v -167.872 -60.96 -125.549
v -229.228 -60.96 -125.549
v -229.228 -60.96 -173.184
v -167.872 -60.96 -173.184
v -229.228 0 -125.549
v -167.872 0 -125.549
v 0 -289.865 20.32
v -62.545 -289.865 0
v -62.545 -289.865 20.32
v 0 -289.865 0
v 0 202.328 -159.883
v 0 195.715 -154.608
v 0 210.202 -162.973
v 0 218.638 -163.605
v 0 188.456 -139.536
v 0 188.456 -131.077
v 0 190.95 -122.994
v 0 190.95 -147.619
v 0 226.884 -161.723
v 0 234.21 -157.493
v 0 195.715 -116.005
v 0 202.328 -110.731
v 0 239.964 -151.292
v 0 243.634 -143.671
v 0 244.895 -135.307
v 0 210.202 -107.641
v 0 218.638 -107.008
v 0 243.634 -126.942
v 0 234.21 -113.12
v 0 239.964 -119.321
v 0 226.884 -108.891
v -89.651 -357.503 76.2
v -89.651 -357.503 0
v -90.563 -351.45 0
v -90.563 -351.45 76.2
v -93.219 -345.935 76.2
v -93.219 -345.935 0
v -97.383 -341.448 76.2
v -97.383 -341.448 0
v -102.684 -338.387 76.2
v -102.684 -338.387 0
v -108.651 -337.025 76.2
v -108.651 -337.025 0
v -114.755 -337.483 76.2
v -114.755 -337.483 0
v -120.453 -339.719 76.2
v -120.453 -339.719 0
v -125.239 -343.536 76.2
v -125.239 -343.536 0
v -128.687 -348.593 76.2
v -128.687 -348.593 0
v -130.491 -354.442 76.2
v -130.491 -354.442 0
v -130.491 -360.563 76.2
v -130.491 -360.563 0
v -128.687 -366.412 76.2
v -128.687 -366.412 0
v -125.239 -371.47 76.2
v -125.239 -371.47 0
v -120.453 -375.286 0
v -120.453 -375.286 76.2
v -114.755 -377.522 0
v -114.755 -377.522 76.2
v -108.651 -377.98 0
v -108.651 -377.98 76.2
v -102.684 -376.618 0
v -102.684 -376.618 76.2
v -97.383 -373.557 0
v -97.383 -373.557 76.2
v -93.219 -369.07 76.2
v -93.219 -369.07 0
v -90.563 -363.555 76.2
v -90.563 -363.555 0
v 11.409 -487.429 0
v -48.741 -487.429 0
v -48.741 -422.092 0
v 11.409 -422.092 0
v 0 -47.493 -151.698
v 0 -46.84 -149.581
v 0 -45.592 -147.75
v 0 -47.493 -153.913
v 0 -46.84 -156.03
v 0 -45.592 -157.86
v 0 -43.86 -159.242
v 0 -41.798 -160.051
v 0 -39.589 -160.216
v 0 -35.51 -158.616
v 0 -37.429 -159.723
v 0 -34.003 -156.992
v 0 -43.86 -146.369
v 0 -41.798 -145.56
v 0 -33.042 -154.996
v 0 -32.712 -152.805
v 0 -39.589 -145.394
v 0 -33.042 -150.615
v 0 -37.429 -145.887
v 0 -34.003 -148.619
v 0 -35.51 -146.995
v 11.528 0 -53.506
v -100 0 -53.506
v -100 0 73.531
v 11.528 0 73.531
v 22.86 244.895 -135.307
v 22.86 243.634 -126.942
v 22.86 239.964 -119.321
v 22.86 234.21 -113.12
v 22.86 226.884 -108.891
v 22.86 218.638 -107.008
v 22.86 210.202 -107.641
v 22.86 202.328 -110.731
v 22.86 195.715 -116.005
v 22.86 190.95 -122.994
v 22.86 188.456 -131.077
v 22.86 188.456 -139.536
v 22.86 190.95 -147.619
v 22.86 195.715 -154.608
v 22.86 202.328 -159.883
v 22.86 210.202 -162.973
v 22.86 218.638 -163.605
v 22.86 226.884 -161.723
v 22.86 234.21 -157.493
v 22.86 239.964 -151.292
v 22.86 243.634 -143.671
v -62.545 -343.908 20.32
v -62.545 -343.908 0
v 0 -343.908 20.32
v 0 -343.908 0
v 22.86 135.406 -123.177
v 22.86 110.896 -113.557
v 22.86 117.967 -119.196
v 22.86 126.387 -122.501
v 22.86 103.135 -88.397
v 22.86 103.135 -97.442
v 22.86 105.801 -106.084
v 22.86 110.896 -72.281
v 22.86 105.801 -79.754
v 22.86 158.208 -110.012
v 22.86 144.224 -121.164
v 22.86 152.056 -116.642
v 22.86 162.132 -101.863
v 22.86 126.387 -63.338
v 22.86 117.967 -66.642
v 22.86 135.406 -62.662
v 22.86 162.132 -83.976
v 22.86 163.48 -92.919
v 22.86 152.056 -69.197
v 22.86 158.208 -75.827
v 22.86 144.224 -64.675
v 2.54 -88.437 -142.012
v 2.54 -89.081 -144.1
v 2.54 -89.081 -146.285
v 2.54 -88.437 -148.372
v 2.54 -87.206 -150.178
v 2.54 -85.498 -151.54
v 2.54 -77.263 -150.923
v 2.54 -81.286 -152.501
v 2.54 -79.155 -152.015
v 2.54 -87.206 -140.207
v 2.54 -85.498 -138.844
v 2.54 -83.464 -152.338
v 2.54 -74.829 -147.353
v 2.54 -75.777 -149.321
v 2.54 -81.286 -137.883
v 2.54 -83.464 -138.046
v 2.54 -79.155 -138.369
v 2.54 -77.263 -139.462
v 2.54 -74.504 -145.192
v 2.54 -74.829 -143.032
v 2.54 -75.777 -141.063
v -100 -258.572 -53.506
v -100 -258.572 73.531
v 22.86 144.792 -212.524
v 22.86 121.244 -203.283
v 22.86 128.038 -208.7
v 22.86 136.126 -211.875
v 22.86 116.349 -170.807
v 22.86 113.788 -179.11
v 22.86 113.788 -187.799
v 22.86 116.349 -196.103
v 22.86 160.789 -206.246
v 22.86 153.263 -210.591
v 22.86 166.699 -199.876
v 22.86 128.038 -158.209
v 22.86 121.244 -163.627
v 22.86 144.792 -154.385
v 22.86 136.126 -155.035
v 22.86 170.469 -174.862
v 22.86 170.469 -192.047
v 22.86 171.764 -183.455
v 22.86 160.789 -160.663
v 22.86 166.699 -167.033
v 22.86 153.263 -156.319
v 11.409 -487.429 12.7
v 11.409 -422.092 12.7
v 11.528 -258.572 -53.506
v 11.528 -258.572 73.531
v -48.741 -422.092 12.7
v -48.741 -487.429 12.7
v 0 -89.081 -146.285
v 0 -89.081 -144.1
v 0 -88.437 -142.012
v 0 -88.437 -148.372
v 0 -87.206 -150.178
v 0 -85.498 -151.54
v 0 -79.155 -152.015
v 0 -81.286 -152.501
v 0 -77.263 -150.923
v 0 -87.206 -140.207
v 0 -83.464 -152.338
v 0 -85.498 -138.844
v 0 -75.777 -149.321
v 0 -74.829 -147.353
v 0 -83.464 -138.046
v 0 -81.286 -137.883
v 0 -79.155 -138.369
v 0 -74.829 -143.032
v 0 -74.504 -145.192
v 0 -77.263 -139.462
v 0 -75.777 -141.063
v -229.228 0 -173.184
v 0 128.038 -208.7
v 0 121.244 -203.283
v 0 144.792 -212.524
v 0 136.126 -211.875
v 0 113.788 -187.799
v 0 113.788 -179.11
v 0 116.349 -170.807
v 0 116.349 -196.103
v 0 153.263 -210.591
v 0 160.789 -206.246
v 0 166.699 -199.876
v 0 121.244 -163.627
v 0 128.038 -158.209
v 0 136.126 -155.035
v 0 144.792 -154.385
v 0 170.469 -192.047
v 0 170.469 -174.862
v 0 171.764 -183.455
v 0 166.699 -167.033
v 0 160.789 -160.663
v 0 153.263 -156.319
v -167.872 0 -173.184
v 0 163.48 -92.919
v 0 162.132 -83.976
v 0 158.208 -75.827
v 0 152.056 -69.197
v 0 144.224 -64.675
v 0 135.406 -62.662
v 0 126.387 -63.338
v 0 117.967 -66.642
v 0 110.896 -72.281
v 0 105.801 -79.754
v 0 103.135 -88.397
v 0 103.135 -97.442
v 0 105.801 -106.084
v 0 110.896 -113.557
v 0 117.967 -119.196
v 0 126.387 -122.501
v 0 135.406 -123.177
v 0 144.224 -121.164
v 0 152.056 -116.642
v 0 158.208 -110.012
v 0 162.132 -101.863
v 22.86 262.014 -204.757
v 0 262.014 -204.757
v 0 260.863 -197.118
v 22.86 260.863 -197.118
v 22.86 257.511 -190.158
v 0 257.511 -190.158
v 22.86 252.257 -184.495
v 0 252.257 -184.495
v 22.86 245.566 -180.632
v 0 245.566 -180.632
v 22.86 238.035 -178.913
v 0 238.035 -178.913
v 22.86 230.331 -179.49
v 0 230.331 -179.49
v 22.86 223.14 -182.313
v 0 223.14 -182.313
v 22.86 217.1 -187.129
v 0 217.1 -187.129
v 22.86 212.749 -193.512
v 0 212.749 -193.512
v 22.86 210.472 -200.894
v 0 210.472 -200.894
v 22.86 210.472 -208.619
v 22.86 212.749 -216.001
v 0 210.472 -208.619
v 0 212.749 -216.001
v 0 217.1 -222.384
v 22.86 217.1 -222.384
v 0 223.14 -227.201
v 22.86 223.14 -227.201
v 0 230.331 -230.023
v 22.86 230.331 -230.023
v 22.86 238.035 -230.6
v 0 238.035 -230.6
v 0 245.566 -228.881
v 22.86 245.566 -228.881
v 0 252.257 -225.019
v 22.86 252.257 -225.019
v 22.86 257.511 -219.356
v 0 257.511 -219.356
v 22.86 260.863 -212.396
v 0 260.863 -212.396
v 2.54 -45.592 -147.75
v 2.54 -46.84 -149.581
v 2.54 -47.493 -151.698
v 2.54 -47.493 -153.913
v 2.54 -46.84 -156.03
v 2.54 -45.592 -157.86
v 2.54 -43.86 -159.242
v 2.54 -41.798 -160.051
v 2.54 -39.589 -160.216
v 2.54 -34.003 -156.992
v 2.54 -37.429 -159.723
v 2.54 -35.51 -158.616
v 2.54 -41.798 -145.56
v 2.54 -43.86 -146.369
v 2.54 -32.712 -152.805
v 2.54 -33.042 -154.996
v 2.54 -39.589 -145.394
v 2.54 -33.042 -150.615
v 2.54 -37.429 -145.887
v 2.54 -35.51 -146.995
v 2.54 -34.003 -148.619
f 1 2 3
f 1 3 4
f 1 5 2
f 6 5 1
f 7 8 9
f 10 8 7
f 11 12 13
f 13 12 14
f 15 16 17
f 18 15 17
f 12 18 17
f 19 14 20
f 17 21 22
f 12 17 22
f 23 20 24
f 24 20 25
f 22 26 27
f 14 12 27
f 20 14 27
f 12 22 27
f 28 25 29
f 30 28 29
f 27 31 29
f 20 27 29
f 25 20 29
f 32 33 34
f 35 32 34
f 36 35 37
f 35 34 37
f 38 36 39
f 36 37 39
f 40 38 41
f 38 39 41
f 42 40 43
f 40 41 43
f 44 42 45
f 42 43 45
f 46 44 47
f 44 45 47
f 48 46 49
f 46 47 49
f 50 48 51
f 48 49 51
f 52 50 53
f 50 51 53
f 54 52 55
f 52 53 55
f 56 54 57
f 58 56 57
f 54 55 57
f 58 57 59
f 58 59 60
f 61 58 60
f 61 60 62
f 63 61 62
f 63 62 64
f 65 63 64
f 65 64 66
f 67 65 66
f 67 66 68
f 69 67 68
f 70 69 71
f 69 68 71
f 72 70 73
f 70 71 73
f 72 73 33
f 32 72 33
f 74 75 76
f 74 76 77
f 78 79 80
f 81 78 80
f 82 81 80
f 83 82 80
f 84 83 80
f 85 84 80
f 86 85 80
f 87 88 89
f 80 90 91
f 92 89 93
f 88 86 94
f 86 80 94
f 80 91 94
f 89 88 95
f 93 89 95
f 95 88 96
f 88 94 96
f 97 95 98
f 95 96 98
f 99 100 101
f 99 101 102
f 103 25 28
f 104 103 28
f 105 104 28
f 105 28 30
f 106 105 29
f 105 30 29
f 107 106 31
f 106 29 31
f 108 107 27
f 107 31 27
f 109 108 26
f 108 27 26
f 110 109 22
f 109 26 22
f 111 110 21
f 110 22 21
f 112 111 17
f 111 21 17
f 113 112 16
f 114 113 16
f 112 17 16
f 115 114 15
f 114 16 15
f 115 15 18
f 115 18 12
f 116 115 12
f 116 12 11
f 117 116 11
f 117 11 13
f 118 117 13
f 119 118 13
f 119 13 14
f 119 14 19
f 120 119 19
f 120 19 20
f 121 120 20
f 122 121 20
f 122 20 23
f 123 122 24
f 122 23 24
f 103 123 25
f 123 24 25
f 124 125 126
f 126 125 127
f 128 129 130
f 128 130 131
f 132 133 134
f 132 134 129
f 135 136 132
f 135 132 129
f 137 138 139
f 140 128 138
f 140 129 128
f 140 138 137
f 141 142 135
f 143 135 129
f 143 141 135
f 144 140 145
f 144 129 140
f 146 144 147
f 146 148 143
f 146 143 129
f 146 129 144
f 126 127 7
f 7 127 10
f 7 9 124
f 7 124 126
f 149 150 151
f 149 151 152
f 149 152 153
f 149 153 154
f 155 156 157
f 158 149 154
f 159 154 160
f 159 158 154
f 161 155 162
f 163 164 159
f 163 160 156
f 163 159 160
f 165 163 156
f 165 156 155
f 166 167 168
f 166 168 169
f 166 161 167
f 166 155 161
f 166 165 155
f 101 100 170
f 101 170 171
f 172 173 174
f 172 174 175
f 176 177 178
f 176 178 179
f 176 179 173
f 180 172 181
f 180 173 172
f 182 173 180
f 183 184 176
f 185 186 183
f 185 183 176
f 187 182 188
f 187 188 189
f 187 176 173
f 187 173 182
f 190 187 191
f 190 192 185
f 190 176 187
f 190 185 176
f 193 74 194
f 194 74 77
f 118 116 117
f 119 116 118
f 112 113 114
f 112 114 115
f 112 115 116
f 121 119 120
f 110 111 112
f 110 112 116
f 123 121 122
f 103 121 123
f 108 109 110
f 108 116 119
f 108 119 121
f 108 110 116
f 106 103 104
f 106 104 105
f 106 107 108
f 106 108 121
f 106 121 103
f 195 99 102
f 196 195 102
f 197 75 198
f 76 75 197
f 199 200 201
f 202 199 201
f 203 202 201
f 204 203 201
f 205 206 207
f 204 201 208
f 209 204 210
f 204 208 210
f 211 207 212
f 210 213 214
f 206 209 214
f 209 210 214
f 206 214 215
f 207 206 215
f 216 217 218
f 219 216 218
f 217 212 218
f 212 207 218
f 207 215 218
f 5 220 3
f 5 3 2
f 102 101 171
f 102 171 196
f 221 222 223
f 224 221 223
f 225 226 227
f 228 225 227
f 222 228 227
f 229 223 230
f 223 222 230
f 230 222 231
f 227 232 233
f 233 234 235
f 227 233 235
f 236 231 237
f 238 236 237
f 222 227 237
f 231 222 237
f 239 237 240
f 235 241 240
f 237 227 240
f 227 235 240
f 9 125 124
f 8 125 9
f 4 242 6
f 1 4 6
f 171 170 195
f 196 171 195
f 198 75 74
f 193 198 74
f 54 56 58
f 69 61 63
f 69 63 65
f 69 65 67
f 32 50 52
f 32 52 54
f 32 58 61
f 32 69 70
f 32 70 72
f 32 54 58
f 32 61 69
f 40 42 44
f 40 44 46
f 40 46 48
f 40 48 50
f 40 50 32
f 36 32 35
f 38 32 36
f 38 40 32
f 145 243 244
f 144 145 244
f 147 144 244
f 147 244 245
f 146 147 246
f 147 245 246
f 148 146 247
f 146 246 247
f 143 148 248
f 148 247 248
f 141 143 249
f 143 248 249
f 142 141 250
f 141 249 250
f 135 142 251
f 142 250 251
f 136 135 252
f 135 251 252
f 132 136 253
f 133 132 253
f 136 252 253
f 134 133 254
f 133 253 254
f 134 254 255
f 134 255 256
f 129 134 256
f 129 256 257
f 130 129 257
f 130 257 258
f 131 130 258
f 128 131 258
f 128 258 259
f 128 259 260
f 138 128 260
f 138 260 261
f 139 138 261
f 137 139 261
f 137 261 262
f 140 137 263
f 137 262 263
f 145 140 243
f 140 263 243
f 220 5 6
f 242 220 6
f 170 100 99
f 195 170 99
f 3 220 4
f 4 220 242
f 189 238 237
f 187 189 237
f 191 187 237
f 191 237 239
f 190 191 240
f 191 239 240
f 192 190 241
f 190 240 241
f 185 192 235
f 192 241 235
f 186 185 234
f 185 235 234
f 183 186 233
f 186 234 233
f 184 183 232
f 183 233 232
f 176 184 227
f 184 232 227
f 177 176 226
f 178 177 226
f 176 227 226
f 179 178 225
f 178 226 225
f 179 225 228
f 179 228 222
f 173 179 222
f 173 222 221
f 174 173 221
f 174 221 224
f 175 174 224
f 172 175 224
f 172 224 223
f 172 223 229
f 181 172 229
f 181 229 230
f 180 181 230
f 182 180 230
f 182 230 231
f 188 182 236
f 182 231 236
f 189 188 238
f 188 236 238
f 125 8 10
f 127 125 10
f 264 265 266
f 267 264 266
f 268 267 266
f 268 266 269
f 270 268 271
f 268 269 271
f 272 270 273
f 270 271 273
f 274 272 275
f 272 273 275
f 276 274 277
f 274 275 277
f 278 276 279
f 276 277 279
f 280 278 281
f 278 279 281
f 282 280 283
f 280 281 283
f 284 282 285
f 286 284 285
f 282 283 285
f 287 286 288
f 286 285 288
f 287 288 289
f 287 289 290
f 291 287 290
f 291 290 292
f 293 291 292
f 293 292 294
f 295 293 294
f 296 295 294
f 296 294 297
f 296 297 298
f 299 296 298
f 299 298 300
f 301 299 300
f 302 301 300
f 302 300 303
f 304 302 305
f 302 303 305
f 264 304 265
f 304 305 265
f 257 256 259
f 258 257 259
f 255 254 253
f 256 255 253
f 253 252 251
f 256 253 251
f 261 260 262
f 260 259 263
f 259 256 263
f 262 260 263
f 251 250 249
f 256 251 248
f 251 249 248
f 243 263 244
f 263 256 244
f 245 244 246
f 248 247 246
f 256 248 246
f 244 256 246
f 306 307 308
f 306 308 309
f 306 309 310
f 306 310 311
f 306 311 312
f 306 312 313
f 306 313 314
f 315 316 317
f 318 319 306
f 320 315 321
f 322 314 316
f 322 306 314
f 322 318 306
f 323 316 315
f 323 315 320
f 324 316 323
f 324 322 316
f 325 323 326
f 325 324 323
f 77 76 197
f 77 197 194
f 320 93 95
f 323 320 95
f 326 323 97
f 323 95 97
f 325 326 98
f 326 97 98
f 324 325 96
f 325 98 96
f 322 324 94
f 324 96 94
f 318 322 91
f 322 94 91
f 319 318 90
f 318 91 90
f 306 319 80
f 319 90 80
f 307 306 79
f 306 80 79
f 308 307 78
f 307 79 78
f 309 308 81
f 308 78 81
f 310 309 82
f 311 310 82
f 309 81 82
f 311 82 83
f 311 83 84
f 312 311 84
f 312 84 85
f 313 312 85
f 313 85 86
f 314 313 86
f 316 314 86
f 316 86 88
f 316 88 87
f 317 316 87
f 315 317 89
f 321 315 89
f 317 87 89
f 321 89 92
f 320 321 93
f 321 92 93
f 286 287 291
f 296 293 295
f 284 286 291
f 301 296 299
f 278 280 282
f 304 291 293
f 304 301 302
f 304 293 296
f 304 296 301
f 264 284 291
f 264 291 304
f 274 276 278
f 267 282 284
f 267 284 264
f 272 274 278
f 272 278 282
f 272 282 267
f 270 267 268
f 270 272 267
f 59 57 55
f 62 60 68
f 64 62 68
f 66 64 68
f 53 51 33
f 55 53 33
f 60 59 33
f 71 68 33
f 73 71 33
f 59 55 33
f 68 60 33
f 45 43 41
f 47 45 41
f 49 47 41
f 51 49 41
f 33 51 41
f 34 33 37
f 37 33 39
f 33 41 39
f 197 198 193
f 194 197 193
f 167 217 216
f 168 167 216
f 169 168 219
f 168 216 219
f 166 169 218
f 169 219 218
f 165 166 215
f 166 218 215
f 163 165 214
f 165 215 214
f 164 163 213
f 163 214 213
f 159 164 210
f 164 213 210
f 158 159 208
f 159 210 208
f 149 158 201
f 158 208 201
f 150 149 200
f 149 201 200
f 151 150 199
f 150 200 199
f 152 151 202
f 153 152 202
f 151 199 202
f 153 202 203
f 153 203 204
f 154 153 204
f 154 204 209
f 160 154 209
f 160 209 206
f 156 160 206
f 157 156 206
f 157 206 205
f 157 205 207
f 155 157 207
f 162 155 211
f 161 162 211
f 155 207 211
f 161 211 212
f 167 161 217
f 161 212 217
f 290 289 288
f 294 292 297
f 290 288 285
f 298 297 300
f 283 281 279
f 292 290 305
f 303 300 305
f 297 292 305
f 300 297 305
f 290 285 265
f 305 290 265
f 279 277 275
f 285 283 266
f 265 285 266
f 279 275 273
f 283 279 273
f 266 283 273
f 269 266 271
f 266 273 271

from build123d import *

# Parameters (mm, degrees)
F0_W      = 111.528584
F0_H      = 127.037018
F1_DEPTH  = 258.572
F2_W      = 62.544964
F2_H      = 54.04234
F3_DEPTH  = 20.32
F4_W      = 61.35641
F4_H      = 47.634989
F5_DEPTH  = 60.96
F6_R      = 28.37764
F6_R_2    = 25.916033
F6_R_3    = 29.151088
F6_R_4    = 30.342157
F7_DEPTH  = 22.86
F8_R      = 7.329758
F9_DEPTH  = 2.54
F10_R     = 7.431939
F11_DEPTH = 2.54
F12_R     = 20.534601
F13_DEPTH = 76.2
F14_W     = 60.150437
F14_H     = 65.336704
F15_DEPTH = 12.7


with BuildPart() as f1:
    # F0 (on Front) → F1 (new body)
    with BuildSketch(Plane.XZ):
        with Locations((-44.236037, 10.01291)):
            Rectangle(F0_W, F0_H)
    extrude(amount=F1_DEPTH)


with BuildPart() as f3:
    # F2 (on Top) → F3 (new body)
    with BuildSketch(Plane.XY):
        with Locations((-31.272482, -316.886425)):
            Rectangle(F2_W, F2_H)
    extrude(amount=F3_DEPTH)


with BuildPart() as f5:
    # F4 (on Front) → F5 (new body)
    with BuildSketch(Plane.XZ):
        with Locations((-198.54974, -149.366155)):
            Rectangle(F4_W, F4_H)
    extrude(amount=F5_DEPTH)


with BuildPart() as f7:
    # F6 (on Right) → F7 (new body)
    with BuildSketch(Plane.YZ):
        with Locations((216.516882, -135.306746)):
            Circle(F6_R)
        with Locations((236.098245, -204.756662)):
            Circle(F6_R_2)
        with Locations((142.613113, -183.454737)):
            Circle(F6_R_3)
        with Locations((133.138269, -92.919379)):
            Circle(F6_R_4)
    extrude(amount=F7_DEPTH)


with BuildPart() as f9:
    # F8 (on Right) → F9 (new body)
    with BuildSketch(Plane.YZ):
        with Locations((-81.833281, -145.192206)):
            Circle(F8_R)
    extrude(amount=F9_DEPTH)


with BuildPart() as f11:
    # F10 (on Right) → F11 (new body)
    with BuildSketch(Plane.YZ):
        with Locations((-40.143982, -152.805269)):
            Circle(F10_R)
    extrude(amount=F11_DEPTH)


with BuildPart() as f13:
    # F12 (on Top) → F13 (new body)
    with BuildSketch(Plane.XY):
        with Locations((-110.185713, -357.502609)):
            Circle(F12_R)
    extrude(amount=F13_DEPTH)


with BuildPart() as f15:
    # F14 (on Top) → F15 (new body)
    with BuildSketch(Plane.XY):
        with Locations((-18.666125, -454.760611)):
            Rectangle(F14_W, F14_H)
    extrude(amount=F15_DEPTH)


solid = Compound([f1.part, f3.part, f5.part, f7.part, f9.part, f11.part, f13.part, f15.part])
